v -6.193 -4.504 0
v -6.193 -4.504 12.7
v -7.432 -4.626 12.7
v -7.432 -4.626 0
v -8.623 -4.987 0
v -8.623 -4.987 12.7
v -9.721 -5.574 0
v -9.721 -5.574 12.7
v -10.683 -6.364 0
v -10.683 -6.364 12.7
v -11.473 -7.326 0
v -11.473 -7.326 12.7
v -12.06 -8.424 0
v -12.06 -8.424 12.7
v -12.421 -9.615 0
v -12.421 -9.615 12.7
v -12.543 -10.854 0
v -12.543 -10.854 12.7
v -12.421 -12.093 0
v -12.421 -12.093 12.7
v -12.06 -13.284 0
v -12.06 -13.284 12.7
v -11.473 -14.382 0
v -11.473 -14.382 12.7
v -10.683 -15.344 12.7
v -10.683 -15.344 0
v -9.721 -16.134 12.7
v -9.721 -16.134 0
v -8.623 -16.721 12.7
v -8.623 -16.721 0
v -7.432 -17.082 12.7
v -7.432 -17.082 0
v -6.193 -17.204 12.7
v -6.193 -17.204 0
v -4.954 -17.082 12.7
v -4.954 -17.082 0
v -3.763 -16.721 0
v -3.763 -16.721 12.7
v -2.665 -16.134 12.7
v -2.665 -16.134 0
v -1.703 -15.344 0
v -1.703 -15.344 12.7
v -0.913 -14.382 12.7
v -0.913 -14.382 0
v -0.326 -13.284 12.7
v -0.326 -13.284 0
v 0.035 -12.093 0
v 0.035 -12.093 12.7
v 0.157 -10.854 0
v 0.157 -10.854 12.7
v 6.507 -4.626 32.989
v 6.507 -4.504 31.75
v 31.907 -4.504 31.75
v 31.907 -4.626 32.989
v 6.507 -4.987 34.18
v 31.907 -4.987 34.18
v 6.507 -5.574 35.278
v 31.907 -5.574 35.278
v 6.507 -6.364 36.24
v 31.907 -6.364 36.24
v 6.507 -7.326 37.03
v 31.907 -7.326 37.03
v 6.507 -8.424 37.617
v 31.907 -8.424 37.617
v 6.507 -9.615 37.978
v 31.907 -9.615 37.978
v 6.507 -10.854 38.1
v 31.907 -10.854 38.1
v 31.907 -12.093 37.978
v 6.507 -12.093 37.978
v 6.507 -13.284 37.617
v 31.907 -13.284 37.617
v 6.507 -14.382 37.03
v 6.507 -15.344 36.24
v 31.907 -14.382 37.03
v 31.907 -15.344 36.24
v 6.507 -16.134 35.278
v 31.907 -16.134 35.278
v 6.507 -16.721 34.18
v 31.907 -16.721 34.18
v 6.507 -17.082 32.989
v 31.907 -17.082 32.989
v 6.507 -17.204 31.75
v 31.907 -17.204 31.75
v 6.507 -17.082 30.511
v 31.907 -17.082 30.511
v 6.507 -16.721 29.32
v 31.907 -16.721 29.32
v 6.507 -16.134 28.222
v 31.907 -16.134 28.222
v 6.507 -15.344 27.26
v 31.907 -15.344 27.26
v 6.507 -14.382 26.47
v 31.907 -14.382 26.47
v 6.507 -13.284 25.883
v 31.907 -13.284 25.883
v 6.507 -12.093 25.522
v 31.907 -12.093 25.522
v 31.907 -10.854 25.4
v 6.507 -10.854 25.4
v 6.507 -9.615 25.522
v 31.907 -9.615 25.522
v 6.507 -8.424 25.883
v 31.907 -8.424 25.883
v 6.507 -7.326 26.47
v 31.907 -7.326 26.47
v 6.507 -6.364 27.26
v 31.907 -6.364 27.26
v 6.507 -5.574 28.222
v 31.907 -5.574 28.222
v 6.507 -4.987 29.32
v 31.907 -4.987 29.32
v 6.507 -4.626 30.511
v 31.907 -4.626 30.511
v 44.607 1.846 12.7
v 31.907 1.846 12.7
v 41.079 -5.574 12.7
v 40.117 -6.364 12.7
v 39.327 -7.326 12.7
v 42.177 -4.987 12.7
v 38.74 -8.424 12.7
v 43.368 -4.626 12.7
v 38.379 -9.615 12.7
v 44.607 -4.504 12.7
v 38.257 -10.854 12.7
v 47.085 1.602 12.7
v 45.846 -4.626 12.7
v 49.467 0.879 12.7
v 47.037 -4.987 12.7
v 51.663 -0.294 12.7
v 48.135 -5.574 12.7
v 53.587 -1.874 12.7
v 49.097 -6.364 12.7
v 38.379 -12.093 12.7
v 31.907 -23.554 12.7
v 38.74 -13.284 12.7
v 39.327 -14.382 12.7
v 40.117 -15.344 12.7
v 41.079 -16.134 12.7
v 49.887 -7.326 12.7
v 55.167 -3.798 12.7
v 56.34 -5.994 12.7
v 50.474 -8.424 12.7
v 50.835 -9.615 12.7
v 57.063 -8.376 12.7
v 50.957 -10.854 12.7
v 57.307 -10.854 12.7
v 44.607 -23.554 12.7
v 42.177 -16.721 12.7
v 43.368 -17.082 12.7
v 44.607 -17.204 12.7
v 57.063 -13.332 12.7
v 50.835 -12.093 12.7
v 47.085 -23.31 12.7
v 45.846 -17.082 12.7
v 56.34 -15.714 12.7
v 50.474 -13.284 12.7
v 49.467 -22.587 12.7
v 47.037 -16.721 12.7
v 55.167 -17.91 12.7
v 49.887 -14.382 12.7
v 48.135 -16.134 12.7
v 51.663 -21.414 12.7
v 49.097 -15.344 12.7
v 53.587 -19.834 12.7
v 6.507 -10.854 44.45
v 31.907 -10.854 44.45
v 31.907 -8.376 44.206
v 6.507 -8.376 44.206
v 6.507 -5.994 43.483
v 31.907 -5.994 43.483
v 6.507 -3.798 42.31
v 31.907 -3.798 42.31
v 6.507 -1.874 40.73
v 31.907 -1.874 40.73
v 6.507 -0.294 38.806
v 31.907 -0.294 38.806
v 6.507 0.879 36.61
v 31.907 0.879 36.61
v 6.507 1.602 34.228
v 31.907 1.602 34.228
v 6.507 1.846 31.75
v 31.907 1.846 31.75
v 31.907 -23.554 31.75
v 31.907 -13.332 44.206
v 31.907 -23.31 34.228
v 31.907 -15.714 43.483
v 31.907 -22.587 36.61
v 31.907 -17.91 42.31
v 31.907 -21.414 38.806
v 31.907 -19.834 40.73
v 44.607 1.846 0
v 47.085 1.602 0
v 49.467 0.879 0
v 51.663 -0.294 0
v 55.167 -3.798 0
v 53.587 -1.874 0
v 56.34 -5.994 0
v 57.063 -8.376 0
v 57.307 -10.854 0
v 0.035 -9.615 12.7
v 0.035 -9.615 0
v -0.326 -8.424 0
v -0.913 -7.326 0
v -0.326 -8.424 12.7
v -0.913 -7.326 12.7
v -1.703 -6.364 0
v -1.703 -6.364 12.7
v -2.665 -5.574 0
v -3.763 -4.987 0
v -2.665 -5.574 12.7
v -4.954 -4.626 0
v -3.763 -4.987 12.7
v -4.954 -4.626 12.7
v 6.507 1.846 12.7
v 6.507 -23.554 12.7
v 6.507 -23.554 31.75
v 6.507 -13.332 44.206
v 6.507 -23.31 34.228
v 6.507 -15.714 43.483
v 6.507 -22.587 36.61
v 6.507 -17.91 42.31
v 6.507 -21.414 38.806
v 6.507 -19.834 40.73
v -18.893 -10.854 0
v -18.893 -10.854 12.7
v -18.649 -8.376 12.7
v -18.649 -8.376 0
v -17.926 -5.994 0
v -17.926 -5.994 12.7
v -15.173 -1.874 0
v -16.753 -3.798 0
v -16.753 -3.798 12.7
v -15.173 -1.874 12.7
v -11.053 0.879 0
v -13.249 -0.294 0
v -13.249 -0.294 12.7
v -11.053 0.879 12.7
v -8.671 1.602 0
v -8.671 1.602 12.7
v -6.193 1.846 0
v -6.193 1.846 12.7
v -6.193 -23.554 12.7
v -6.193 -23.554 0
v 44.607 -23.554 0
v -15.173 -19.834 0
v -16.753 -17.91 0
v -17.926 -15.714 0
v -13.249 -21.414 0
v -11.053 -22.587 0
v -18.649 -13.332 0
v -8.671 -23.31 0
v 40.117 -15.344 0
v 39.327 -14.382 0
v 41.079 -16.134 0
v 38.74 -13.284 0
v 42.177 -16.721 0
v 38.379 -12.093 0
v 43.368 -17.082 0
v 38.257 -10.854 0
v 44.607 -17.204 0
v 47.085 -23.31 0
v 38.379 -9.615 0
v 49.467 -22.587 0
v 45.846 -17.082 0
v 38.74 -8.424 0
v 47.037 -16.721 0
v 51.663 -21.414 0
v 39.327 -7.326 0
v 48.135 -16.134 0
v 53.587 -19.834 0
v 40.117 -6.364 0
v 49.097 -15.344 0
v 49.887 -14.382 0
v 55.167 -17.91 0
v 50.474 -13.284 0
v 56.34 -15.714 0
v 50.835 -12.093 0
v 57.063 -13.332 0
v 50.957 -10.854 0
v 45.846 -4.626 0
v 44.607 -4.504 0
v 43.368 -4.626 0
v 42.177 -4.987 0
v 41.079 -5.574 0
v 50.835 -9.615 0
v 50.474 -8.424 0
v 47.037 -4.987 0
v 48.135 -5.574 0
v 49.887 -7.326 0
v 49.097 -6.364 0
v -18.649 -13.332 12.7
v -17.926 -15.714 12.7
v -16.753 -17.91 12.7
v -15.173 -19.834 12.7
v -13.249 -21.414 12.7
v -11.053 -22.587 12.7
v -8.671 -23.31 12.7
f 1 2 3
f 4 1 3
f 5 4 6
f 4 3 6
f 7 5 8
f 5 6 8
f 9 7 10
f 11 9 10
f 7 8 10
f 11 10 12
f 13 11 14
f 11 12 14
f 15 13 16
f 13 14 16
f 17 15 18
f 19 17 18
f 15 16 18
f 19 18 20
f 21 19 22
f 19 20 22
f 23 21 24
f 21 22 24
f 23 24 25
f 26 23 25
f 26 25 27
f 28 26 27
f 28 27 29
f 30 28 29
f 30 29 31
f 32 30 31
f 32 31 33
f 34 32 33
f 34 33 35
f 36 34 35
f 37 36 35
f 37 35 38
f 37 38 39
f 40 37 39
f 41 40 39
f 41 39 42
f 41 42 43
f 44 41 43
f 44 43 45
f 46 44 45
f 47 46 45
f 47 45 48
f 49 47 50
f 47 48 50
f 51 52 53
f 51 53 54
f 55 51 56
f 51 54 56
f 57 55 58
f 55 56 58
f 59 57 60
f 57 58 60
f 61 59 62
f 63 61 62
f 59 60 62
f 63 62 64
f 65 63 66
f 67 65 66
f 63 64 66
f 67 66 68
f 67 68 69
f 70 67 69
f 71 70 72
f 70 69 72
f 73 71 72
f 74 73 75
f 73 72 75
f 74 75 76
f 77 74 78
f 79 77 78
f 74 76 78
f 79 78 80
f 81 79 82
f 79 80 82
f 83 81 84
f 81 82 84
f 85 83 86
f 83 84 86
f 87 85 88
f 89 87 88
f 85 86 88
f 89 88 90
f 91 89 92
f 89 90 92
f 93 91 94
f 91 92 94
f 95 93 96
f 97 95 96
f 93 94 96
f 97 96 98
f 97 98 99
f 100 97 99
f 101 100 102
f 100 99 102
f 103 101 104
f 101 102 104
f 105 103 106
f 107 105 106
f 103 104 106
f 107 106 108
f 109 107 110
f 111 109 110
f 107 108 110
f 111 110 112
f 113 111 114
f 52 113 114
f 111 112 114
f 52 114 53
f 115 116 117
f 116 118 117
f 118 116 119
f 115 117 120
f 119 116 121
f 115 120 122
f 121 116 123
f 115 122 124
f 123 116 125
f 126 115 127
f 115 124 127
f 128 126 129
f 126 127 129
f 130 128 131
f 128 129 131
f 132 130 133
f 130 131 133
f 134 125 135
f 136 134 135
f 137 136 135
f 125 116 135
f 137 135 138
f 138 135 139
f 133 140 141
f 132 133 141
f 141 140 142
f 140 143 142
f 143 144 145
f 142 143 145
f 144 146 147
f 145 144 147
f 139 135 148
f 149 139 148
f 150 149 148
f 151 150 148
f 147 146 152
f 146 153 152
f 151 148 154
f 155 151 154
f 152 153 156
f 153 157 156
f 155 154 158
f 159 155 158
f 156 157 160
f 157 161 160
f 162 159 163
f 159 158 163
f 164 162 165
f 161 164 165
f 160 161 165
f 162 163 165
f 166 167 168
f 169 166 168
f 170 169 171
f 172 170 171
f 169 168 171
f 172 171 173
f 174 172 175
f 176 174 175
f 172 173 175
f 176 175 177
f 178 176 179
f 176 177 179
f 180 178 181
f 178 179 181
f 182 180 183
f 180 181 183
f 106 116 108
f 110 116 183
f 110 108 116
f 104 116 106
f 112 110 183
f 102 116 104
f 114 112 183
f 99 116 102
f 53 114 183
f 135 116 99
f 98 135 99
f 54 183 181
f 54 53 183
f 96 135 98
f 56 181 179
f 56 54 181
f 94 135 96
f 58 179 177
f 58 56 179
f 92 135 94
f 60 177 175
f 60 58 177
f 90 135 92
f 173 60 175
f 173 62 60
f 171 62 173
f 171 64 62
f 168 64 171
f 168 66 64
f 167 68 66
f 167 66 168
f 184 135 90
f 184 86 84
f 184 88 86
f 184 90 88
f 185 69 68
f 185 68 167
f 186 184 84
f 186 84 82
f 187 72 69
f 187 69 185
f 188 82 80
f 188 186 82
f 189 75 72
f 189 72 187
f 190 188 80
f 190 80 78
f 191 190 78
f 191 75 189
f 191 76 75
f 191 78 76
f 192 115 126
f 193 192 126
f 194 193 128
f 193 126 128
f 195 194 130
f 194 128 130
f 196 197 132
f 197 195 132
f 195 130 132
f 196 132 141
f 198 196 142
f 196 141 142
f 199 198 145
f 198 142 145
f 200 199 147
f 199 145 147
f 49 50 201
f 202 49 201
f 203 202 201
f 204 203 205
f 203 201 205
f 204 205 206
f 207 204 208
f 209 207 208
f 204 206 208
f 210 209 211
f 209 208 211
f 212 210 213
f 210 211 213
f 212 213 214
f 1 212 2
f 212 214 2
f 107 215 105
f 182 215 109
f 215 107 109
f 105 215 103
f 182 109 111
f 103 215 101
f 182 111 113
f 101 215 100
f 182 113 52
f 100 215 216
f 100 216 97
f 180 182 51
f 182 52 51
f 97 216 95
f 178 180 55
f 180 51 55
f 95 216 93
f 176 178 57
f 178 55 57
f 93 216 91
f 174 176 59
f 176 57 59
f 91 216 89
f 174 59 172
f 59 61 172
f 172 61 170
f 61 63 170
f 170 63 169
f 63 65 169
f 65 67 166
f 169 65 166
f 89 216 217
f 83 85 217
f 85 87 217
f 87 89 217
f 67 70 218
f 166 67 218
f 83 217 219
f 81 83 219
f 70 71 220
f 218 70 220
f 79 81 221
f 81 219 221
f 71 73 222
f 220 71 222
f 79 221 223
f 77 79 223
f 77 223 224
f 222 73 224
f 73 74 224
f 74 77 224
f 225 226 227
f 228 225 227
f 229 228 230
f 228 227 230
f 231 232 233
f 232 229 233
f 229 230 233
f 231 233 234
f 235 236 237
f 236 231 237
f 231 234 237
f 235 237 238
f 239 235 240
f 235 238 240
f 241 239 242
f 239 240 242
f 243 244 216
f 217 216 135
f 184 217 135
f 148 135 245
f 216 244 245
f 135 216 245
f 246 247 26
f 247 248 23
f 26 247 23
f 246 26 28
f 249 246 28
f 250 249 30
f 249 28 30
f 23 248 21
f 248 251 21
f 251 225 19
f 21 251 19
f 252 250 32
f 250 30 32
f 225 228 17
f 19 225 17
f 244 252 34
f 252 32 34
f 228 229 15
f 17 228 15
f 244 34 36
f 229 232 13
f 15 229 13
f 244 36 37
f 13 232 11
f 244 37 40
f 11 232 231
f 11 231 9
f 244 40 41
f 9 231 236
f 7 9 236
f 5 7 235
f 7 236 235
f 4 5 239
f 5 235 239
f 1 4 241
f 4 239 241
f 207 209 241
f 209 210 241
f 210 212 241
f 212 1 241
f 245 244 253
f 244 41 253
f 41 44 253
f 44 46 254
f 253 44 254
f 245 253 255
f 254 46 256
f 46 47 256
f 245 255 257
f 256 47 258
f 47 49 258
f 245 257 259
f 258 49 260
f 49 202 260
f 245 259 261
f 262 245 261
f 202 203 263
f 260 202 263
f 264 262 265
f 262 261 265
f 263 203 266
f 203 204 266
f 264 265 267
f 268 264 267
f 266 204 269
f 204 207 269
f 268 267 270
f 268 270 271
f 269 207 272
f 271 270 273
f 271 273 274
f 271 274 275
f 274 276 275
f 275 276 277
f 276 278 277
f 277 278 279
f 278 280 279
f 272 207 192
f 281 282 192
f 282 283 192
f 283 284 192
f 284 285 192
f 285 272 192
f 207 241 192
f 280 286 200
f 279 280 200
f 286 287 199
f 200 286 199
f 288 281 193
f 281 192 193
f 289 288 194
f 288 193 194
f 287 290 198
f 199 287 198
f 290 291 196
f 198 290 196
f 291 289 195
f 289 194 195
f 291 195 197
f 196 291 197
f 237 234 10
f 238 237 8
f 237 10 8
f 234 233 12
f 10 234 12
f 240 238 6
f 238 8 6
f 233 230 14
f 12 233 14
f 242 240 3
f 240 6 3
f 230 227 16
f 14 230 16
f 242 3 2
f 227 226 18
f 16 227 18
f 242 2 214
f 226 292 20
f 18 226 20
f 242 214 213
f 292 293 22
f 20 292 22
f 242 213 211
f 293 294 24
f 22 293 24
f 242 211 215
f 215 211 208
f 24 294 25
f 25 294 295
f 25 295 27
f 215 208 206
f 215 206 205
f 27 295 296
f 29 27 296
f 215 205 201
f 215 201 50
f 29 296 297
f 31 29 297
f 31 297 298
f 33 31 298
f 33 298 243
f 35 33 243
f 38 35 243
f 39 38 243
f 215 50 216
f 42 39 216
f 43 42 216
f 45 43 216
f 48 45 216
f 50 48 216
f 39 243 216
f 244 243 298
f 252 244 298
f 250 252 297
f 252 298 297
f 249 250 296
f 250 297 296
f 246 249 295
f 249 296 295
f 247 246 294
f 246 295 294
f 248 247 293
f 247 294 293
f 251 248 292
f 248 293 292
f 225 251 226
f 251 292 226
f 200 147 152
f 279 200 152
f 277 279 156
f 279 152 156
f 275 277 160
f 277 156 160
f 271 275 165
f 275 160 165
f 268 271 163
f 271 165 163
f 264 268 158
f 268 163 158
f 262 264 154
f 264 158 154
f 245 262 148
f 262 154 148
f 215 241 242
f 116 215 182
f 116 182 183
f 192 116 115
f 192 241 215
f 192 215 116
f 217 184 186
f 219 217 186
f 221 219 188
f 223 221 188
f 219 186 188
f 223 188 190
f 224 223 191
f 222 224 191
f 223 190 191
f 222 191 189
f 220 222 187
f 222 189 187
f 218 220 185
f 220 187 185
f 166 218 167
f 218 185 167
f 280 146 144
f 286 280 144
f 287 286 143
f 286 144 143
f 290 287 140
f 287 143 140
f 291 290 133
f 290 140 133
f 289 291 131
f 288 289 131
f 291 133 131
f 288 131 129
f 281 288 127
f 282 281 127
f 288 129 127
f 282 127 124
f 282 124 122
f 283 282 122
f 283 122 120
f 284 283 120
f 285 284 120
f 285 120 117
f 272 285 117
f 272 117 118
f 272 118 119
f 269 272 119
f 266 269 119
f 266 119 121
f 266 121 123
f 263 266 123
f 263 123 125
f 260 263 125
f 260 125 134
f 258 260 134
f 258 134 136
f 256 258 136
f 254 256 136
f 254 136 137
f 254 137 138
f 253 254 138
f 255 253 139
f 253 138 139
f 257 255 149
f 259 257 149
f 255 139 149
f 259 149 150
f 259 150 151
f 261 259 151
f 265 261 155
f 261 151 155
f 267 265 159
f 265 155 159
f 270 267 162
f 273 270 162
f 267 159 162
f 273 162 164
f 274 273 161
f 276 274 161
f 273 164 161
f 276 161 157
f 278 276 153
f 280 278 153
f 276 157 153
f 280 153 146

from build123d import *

# Parameters (mm, degrees)
F0_W      = 76.2
F0_H      = 25.4
F1_DEPTH  = 44.45
F2_W      = 25.4
F2_H      = 31.75
F3_DEPTH  = 25.4
F4_R      = 6.35
F5_DEPTH  = 25.4
F7_DEPTH  = 25.4
F9_DEPTH  = 25.4
F11_DEPTH = 25.4
F13_DEPTH = 25.4
F15_DEPTH = 25.4


with BuildPart() as f1:
    # F0 (on Top) → F1 (new body)
    with BuildSketch(Plane.XY):
        with Locations((19.2070399102, -10.8540700749)):
            Rectangle(F0_W, F0_H)
    extrude(amount=F1_DEPTH)

    # F2 (on face) → F3 (cut)
    with BuildSketch(Plane.XZ.offset(23.5540700749)):
        with Locations((-6.1929600898, 28.575)):
            Rectangle(F2_W, F2_H)
        with Locations((44.6070399102, 28.575)):
            Rectangle(F2_W, F2_H)
    extrude(amount=-F3_DEPTH, mode=Mode.SUBTRACT)

    # F4 (on face) → F5 (cut)
    with BuildSketch(Plane.XY.offset(12.7)):
        with Locations((44.6070399102, -10.8540700749)):
            Circle(F4_R)
    extrude(amount=-F5_DEPTH, mode=Mode.SUBTRACT)

    # F6 (on face) → F7 (cut)
    with BuildSketch(Plane.XY.offset(12.7)):
        with BuildLine():
            ThreePointArc((-6.1929600898, -4.5040700749), (-10.6830881503, -15.3441981354), (0.1570399102, -10.8540700749))
            ThreePointArc((0.1570399102, -10.8540700749), (-1.7028320292, -6.3639420143), (-6.1929600898, -4.5040700749))
        make_face()
    extrude(amount=-F7_DEPTH, mode=Mode.SUBTRACT)

    # F8 (on face) → F9 (cut)
    with BuildSketch(Plane.XY.offset(12.7)):
        with BuildLine():
            ThreePointArc((44.6070399102, 1.8459299251), (53.5872960313, -1.8738139538), (57.3070399102, -10.8540700749))
            Line((57.3070399102, -10.8540700749), (57.3070399102, 1.8459299251))
            Line((57.3070399102, 1.8459299251), (44.6070399102, 1.8459299251))
        make_face()
        with BuildLine():
            ThreePointArc((57.3070399102, -10.8540700749), (53.5872960313, -19.8343261959), (44.6070399102, -23.5540700749))
            Line((44.6070399102, -23.5540700749), (57.3070399102, -23.5540700749))
            Line((57.3070399102, -23.5540700749), (57.3070399102, -10.8540700749))
        make_face()
    extrude(amount=-F9_DEPTH, mode=Mode.SUBTRACT)

    # F10 (on face) → F11 (cut)
    with BuildSketch(Plane.XY.offset(12.7)):
        with BuildLine():
            ThreePointArc((-6.1929600898, -23.5540700749), (-15.173216183, -19.8343262238), (-18.8929600898, -10.8540701536))
            Line((-18.8929600898, -10.8540701536), (-18.8929600898, -23.5540700749))
            Line((-18.8929600898, -23.5540700749), (-6.1929600898, -23.5540700749))
        make_face()
        with BuildLine():
            ThreePointArc((-18.8929600898, -10.8540701536), (-15.1732162387, -1.8738139816), (-6.1929600898, 1.8459299251))
            Line((-6.1929600898, 1.8459299251), (-18.8929600898, 1.8459299251))
            Line((-18.8929600898, 1.8459299251), (-18.8929600898, -10.8540701536))
        make_face()
    extrude(amount=-F11_DEPTH, mode=Mode.SUBTRACT)

    # F12 (on face) → F13 (cut)
    with BuildSketch(Plane.YZ.offset(31.9070399102)):
        with BuildLine():
            Line((-4.5040700749, 31.75), (-17.2040700749, 31.75))
            ThreePointArc((-17.2040700749, 31.75), (-10.8540700749, 25.4), (-4.5040700749, 31.75))
        make_face()
        with BuildLine():
            ThreePointArc((-4.5040700749, 31.75), (-10.8540700749, 38.1), (-17.2040700749, 31.75))
            Line((-17.2040700749, 31.75), (-4.5040700749, 31.75))
        make_face()
    extrude(amount=-F13_DEPTH, mode=Mode.SUBTRACT)

    # F14 (on face) → F15 (cut)
    with BuildSketch(Plane.YZ.offset(31.9070399102)):
        with BuildLine():
            ThreePointArc((-23.5540700749, 31.75), (-19.8343261959, 40.7302561211), (-10.8540700749, 44.45))
            Line((-10.8540700749, 44.45), (-23.5540700749, 44.45))
            Line((-23.5540700749, 44.45), (-23.5540700749, 31.75))
        make_face()
        with BuildLine():
            ThreePointArc((-10.8540700749, 44.45), (-1.8738139538, 40.7302561211), (1.8459299251, 31.75))
            Line((1.8459299251, 31.75), (1.8459299251, 44.45))
            Line((1.8459299251, 44.45), (-10.8540700749, 44.45))
        make_face()
    extrude(amount=-F15_DEPTH, mode=Mode.SUBTRACT)


solid = f1.part
